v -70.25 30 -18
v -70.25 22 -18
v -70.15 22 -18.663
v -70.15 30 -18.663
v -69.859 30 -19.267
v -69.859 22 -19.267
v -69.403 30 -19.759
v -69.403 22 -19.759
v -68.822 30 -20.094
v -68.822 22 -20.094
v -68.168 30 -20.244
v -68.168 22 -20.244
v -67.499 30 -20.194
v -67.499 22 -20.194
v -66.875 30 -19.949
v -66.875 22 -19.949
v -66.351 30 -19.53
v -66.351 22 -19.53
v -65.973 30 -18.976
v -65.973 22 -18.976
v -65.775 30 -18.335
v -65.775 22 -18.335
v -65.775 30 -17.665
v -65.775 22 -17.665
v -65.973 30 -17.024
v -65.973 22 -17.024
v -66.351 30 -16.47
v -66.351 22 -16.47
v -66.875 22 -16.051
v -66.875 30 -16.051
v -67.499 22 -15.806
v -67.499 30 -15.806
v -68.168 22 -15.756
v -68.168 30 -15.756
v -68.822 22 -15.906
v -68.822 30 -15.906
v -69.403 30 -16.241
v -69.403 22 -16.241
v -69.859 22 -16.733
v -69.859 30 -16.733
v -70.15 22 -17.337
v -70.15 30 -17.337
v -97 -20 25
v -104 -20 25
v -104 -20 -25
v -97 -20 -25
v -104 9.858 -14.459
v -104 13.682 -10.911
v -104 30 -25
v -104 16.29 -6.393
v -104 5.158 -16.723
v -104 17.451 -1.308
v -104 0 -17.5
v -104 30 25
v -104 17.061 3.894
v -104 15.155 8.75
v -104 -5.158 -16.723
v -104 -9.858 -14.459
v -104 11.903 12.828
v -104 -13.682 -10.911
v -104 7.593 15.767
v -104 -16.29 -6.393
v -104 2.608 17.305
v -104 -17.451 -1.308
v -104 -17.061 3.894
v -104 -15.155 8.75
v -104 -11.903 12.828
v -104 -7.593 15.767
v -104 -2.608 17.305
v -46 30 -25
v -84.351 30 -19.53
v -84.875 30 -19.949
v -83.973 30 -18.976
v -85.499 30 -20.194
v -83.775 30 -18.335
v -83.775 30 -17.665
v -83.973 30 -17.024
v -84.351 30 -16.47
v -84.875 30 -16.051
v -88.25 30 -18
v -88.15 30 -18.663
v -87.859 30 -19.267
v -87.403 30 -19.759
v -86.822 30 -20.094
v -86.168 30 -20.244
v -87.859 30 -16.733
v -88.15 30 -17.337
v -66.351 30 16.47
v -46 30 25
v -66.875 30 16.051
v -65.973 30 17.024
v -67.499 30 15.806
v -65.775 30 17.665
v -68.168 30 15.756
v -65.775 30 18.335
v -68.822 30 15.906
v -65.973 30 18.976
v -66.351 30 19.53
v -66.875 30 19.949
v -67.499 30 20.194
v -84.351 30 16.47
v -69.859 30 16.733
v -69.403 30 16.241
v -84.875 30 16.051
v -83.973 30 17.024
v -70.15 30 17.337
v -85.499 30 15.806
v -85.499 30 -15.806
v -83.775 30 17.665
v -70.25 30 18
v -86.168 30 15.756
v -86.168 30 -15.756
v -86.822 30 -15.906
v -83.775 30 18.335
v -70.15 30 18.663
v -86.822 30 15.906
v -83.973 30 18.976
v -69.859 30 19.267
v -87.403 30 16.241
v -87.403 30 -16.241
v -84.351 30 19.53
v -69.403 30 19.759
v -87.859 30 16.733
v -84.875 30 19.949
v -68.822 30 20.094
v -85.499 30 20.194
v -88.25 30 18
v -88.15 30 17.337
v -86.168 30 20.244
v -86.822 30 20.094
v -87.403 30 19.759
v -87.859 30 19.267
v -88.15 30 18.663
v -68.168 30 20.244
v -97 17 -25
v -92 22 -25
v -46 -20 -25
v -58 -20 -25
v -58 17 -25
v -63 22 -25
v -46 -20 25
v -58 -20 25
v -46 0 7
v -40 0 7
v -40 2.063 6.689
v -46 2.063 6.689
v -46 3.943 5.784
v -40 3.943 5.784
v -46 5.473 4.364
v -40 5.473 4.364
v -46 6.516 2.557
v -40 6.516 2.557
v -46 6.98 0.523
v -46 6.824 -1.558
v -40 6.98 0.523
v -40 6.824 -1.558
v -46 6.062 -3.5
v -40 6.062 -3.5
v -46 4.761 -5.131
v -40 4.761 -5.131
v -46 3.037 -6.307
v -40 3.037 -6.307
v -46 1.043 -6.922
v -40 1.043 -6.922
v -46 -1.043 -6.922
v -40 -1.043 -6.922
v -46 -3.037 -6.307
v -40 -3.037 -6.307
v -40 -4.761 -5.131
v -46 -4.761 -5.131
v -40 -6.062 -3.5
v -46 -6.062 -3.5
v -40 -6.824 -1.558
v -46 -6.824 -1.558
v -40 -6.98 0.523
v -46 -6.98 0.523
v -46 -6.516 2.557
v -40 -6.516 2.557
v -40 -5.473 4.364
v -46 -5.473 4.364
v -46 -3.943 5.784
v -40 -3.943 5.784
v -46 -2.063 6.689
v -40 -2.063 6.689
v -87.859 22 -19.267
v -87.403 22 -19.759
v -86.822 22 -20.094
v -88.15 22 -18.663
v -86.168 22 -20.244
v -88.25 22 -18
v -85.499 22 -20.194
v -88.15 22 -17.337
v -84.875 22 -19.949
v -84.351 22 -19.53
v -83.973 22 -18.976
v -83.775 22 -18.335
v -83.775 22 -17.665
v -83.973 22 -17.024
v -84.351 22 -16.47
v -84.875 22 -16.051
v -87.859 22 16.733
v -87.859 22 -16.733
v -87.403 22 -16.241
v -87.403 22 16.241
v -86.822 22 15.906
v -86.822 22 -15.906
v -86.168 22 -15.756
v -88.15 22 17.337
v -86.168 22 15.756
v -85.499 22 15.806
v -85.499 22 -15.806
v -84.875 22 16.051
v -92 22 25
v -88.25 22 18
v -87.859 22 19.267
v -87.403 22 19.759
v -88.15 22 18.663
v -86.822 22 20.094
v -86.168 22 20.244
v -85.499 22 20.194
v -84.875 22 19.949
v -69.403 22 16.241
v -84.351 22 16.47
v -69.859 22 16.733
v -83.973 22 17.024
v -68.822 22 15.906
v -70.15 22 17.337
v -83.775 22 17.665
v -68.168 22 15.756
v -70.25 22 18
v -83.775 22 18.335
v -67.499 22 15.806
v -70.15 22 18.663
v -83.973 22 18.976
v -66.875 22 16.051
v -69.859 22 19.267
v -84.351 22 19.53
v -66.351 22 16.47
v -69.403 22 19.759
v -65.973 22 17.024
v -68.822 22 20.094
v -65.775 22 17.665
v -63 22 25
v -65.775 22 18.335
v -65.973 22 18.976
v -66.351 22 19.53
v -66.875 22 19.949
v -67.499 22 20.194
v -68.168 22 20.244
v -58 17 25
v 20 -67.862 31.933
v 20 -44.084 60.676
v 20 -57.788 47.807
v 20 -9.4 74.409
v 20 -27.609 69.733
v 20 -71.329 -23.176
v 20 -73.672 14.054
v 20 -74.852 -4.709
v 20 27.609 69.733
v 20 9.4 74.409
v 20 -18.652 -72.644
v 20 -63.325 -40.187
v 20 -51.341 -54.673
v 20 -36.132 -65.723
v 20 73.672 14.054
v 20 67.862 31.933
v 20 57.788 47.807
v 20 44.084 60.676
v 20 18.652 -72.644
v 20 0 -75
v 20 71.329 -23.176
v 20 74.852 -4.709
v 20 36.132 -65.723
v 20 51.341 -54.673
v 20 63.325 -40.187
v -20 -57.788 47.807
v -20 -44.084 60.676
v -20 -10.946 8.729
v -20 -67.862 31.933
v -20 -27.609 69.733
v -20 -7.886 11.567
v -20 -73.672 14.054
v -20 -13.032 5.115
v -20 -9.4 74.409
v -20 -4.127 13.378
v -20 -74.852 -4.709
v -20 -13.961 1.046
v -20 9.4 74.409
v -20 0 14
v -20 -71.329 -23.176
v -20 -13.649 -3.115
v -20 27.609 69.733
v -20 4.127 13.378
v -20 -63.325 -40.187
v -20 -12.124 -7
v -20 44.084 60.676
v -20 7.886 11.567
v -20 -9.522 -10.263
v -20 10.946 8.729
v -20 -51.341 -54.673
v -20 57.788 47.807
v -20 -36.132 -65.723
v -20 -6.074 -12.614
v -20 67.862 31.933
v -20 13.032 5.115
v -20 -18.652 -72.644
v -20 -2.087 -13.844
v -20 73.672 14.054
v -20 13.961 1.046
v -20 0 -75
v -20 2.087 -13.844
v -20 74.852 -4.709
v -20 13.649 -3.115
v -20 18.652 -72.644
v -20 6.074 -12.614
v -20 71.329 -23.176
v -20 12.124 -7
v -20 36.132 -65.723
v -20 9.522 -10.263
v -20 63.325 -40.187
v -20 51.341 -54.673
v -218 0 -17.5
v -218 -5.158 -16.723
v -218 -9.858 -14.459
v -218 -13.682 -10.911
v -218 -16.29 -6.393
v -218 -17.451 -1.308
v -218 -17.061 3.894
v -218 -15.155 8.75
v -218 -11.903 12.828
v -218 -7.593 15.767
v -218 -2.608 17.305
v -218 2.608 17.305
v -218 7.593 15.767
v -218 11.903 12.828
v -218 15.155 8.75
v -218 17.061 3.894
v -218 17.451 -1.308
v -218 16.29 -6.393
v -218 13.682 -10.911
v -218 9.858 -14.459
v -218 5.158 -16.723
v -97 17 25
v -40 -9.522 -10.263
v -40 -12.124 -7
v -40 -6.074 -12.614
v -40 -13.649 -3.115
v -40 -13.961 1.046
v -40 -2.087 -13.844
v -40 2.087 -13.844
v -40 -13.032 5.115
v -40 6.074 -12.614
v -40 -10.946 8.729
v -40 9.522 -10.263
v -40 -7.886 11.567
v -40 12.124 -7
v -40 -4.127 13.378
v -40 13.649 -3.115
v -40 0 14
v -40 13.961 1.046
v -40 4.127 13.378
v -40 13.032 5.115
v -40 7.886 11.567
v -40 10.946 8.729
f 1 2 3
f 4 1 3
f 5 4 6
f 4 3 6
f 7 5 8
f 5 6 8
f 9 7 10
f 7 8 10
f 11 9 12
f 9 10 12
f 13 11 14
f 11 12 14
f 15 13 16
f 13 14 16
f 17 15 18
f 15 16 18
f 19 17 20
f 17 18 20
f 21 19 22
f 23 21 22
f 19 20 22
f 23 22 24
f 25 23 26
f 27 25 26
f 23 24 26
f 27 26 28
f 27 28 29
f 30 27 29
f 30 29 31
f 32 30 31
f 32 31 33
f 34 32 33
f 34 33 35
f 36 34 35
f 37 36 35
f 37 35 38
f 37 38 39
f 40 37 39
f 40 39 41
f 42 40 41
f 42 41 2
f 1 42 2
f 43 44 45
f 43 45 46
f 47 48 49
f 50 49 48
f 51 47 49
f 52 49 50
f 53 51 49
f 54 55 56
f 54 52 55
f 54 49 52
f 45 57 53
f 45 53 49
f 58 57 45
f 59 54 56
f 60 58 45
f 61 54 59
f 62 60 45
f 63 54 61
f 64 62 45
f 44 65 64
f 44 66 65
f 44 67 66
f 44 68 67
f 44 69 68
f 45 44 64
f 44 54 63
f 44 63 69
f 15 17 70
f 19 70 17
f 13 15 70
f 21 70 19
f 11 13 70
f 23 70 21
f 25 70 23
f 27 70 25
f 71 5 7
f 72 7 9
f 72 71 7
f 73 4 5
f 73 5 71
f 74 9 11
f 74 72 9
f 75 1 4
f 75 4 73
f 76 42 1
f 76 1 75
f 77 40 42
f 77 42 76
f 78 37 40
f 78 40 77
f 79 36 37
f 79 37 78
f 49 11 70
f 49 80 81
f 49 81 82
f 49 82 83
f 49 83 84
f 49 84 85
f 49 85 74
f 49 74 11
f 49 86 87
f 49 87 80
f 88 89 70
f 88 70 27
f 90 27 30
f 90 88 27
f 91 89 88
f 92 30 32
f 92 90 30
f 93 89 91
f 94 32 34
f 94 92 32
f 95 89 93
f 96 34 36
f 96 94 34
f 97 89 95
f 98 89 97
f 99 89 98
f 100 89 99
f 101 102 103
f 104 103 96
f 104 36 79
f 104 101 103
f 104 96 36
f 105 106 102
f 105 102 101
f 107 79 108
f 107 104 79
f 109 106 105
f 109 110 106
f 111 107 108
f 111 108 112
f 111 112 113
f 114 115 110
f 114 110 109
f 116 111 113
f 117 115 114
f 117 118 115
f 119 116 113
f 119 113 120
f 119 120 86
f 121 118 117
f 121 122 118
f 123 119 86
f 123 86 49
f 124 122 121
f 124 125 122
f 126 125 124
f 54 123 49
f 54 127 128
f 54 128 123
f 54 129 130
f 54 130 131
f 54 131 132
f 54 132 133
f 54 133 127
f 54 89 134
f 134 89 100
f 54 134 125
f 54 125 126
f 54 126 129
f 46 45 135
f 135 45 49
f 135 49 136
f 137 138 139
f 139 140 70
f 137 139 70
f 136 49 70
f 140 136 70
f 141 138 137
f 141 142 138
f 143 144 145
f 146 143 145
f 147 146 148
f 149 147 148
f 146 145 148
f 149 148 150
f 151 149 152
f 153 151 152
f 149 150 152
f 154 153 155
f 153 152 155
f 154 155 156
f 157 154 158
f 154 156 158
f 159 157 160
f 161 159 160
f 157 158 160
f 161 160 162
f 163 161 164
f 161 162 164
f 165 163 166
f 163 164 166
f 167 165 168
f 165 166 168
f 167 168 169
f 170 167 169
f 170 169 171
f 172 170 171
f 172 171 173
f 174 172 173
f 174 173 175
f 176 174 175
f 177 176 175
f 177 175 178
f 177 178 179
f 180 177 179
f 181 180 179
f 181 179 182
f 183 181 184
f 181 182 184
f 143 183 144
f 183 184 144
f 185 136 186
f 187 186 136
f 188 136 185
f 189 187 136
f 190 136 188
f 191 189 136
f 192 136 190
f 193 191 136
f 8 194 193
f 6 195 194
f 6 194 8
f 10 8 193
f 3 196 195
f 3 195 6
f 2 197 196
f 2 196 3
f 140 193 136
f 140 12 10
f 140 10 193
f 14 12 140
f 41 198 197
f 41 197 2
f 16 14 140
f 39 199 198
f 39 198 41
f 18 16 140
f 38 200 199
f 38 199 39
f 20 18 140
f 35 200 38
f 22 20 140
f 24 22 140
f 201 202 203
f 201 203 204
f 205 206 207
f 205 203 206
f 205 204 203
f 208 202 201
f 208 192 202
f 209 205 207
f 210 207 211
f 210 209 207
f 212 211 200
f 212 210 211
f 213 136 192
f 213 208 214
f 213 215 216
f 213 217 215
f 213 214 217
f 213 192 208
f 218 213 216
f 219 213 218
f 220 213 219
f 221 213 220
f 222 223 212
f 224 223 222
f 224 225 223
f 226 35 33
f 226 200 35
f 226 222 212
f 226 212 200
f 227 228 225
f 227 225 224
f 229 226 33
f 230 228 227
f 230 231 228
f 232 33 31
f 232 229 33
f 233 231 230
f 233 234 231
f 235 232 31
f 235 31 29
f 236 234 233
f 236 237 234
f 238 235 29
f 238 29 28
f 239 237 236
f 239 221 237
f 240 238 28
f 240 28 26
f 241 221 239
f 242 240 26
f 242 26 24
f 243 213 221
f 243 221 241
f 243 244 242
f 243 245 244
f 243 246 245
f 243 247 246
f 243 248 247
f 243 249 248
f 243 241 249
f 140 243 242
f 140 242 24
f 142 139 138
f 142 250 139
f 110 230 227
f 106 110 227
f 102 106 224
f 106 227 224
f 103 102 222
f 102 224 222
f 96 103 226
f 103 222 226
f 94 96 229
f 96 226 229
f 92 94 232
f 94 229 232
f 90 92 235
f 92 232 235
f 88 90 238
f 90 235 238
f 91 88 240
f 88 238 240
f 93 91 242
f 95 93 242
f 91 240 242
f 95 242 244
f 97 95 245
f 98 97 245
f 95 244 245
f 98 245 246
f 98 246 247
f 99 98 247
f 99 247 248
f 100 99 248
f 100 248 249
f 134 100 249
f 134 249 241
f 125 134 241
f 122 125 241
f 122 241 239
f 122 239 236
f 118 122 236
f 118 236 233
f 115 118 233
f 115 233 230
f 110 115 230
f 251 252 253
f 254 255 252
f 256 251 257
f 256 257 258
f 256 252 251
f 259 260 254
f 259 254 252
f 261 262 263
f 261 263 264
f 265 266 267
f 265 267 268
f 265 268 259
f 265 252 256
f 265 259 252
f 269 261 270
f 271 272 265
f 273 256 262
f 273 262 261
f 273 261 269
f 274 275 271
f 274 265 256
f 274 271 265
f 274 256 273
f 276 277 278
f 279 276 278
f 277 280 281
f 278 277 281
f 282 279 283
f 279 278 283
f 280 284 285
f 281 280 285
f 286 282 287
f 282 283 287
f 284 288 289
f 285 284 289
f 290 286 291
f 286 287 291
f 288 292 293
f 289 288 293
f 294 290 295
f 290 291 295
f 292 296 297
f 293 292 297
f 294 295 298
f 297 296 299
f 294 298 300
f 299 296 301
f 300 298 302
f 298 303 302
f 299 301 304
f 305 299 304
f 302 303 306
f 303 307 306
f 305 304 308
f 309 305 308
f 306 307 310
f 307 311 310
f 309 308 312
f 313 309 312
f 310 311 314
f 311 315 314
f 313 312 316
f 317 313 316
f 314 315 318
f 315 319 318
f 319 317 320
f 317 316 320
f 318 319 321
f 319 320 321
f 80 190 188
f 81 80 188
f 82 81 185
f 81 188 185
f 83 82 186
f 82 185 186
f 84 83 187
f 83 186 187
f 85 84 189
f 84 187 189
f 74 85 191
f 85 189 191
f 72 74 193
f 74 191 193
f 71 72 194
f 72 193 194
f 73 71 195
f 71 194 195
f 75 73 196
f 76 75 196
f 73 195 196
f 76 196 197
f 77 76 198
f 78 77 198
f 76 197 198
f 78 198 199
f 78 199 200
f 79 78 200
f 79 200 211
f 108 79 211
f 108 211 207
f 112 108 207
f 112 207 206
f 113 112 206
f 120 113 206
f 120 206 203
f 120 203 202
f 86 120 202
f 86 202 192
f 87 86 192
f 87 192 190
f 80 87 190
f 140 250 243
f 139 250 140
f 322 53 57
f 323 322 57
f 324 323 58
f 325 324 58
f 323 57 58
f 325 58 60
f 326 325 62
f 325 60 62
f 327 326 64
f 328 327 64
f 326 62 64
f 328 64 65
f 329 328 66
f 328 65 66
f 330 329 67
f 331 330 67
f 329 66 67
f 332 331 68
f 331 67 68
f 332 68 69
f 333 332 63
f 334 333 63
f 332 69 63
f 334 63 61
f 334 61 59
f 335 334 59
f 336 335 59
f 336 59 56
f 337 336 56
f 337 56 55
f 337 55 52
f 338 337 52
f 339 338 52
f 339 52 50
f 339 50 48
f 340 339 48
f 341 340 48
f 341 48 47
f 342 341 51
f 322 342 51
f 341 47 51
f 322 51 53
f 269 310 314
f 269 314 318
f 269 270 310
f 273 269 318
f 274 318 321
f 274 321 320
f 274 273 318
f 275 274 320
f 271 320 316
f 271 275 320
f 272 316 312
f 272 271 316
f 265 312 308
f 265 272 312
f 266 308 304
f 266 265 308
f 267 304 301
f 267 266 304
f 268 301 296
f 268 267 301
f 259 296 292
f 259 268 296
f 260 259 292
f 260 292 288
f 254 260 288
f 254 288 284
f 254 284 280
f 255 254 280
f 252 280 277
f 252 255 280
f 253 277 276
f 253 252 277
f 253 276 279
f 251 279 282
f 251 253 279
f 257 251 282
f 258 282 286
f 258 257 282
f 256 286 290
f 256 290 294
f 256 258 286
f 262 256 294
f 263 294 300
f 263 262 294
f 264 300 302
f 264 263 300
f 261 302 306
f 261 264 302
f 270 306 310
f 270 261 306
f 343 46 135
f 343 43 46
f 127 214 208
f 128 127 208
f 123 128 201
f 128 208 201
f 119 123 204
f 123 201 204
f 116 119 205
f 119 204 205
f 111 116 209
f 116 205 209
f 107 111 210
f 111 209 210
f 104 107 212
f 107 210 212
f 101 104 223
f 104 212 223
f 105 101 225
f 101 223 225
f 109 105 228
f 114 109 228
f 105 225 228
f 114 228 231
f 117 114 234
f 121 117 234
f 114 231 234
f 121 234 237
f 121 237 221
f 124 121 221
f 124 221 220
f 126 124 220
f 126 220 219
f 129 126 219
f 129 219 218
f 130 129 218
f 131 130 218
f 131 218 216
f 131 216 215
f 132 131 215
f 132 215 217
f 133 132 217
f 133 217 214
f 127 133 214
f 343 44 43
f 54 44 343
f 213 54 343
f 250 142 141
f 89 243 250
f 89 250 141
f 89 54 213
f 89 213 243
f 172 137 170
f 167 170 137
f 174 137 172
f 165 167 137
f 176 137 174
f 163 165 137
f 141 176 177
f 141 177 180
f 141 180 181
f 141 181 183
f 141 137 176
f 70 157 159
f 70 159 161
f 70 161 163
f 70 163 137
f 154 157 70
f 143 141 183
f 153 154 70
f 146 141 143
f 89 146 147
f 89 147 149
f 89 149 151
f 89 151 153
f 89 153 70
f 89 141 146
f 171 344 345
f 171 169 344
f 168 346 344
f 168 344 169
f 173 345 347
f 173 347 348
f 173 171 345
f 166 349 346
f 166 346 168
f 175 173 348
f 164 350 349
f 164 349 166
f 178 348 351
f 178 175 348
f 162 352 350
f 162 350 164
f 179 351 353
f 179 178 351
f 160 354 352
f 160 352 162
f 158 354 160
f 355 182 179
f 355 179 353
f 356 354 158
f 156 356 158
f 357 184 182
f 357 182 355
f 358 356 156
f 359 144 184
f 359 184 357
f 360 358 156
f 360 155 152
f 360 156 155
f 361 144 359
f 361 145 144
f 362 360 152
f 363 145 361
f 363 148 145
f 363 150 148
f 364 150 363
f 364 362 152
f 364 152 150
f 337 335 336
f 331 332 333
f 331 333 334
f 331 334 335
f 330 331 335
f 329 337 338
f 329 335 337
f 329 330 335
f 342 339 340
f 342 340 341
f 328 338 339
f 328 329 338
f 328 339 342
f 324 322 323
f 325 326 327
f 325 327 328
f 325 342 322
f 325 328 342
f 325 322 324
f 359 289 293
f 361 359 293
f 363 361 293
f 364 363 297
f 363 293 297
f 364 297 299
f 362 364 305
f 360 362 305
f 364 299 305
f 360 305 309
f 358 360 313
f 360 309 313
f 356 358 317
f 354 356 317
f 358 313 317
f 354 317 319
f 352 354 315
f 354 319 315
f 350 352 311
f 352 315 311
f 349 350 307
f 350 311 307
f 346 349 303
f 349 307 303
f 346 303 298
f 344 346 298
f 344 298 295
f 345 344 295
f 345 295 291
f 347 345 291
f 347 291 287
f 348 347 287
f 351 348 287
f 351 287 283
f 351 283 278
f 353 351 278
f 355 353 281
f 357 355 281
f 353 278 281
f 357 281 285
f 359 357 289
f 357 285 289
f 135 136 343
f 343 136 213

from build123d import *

# Parameters (mm, degrees)
SZKIC1_R                    = 75
DODANIE_WYCI_GNI_CIE1_DEPTH = 20
SZKIC2_R                    = 14
DODANIE_WYCI_GNI_CIE2_DEPTH = 20
SZKIC3_R                    = 7
DODANIE_WYCI_GNI_CIE3_DEPTH = 6
DODANIE_WYCI_GNI_CIE4_DEPTH = 25
SFAZOWANIE1_SIZE            = 5
SZKIC5_R                    = 17.5
DODANIE_WYCI_GNI_CIE5_DEPTH = 114
OTW_R_POD_RUB_M41_D         = 4.5


with BuildPart() as part:
    # Szkic1 → Dodanie-wyciągnięcie1 (new, symmetric)
    with BuildSketch(Plane(origin=(0, 0, 0), x_dir=(0, 0, -1), z_dir=(1, 0, 0))):
        Circle(SZKIC1_R)
    extrude(amount=DODANIE_WYCI_GNI_CIE1_DEPTH, both=True)

    # Szkic2 → Dodanie-wyciągnięcie2 (add)
    with BuildSketch(Plane.ZY.offset(20)):
        Circle(SZKIC2_R)
    extrude(amount=DODANIE_WYCI_GNI_CIE2_DEPTH)

    # Szkic3 → Dodanie-wyciągnięcie3 (add)
    with BuildSketch(Plane.ZY.offset(40)):
        Circle(SZKIC3_R)
    extrude(amount=DODANIE_WYCI_GNI_CIE3_DEPTH)

    # Szkic4 → Dodanie-wyciągnięcie4 (add, symmetric)
    with BuildSketch(Plane.XY):
        Polygon((-46, -20), (-46, 30), (-104, 30), (-104, -20), (-97, -20), (-97, 22), (-58, 22), (-58, -20), align=None)
    extrude(amount=DODANIE_WYCI_GNI_CIE4_DEPTH, both=True)

    # Sfazowanie1
    sfazowanie1_edges = [part.edges().sort_by_distance(p)[0] for p in [
        (-97, 22, 0),
        (-58, 22, 0),
    ]]
    chamfer(sfazowanie1_edges, length=SFAZOWANIE1_SIZE)

    # Szkic5 → Dodanie-wyciągnięcie5 (add)
    with BuildSketch(Plane.ZY.offset(104)):
        with Locations(Location((0, 0, 0), (0, 0, 180))):
            Circle(SZKIC5_R)
    extrude(amount=DODANIE_WYCI_GNI_CIE5_DEPTH)

    # Otwór pod śrubę M41 (through all)
    with Locations(Plane(origin=(0, 30, 0), x_dir=(1, 0, 0), z_dir=(0, 1, 0))):
        with Locations((-68, 18), (-86, 18), (-68, -18), (-86, -18)):
            Hole(OTW_R_POD_RUB_M41_D / 2)


solid = part.part
